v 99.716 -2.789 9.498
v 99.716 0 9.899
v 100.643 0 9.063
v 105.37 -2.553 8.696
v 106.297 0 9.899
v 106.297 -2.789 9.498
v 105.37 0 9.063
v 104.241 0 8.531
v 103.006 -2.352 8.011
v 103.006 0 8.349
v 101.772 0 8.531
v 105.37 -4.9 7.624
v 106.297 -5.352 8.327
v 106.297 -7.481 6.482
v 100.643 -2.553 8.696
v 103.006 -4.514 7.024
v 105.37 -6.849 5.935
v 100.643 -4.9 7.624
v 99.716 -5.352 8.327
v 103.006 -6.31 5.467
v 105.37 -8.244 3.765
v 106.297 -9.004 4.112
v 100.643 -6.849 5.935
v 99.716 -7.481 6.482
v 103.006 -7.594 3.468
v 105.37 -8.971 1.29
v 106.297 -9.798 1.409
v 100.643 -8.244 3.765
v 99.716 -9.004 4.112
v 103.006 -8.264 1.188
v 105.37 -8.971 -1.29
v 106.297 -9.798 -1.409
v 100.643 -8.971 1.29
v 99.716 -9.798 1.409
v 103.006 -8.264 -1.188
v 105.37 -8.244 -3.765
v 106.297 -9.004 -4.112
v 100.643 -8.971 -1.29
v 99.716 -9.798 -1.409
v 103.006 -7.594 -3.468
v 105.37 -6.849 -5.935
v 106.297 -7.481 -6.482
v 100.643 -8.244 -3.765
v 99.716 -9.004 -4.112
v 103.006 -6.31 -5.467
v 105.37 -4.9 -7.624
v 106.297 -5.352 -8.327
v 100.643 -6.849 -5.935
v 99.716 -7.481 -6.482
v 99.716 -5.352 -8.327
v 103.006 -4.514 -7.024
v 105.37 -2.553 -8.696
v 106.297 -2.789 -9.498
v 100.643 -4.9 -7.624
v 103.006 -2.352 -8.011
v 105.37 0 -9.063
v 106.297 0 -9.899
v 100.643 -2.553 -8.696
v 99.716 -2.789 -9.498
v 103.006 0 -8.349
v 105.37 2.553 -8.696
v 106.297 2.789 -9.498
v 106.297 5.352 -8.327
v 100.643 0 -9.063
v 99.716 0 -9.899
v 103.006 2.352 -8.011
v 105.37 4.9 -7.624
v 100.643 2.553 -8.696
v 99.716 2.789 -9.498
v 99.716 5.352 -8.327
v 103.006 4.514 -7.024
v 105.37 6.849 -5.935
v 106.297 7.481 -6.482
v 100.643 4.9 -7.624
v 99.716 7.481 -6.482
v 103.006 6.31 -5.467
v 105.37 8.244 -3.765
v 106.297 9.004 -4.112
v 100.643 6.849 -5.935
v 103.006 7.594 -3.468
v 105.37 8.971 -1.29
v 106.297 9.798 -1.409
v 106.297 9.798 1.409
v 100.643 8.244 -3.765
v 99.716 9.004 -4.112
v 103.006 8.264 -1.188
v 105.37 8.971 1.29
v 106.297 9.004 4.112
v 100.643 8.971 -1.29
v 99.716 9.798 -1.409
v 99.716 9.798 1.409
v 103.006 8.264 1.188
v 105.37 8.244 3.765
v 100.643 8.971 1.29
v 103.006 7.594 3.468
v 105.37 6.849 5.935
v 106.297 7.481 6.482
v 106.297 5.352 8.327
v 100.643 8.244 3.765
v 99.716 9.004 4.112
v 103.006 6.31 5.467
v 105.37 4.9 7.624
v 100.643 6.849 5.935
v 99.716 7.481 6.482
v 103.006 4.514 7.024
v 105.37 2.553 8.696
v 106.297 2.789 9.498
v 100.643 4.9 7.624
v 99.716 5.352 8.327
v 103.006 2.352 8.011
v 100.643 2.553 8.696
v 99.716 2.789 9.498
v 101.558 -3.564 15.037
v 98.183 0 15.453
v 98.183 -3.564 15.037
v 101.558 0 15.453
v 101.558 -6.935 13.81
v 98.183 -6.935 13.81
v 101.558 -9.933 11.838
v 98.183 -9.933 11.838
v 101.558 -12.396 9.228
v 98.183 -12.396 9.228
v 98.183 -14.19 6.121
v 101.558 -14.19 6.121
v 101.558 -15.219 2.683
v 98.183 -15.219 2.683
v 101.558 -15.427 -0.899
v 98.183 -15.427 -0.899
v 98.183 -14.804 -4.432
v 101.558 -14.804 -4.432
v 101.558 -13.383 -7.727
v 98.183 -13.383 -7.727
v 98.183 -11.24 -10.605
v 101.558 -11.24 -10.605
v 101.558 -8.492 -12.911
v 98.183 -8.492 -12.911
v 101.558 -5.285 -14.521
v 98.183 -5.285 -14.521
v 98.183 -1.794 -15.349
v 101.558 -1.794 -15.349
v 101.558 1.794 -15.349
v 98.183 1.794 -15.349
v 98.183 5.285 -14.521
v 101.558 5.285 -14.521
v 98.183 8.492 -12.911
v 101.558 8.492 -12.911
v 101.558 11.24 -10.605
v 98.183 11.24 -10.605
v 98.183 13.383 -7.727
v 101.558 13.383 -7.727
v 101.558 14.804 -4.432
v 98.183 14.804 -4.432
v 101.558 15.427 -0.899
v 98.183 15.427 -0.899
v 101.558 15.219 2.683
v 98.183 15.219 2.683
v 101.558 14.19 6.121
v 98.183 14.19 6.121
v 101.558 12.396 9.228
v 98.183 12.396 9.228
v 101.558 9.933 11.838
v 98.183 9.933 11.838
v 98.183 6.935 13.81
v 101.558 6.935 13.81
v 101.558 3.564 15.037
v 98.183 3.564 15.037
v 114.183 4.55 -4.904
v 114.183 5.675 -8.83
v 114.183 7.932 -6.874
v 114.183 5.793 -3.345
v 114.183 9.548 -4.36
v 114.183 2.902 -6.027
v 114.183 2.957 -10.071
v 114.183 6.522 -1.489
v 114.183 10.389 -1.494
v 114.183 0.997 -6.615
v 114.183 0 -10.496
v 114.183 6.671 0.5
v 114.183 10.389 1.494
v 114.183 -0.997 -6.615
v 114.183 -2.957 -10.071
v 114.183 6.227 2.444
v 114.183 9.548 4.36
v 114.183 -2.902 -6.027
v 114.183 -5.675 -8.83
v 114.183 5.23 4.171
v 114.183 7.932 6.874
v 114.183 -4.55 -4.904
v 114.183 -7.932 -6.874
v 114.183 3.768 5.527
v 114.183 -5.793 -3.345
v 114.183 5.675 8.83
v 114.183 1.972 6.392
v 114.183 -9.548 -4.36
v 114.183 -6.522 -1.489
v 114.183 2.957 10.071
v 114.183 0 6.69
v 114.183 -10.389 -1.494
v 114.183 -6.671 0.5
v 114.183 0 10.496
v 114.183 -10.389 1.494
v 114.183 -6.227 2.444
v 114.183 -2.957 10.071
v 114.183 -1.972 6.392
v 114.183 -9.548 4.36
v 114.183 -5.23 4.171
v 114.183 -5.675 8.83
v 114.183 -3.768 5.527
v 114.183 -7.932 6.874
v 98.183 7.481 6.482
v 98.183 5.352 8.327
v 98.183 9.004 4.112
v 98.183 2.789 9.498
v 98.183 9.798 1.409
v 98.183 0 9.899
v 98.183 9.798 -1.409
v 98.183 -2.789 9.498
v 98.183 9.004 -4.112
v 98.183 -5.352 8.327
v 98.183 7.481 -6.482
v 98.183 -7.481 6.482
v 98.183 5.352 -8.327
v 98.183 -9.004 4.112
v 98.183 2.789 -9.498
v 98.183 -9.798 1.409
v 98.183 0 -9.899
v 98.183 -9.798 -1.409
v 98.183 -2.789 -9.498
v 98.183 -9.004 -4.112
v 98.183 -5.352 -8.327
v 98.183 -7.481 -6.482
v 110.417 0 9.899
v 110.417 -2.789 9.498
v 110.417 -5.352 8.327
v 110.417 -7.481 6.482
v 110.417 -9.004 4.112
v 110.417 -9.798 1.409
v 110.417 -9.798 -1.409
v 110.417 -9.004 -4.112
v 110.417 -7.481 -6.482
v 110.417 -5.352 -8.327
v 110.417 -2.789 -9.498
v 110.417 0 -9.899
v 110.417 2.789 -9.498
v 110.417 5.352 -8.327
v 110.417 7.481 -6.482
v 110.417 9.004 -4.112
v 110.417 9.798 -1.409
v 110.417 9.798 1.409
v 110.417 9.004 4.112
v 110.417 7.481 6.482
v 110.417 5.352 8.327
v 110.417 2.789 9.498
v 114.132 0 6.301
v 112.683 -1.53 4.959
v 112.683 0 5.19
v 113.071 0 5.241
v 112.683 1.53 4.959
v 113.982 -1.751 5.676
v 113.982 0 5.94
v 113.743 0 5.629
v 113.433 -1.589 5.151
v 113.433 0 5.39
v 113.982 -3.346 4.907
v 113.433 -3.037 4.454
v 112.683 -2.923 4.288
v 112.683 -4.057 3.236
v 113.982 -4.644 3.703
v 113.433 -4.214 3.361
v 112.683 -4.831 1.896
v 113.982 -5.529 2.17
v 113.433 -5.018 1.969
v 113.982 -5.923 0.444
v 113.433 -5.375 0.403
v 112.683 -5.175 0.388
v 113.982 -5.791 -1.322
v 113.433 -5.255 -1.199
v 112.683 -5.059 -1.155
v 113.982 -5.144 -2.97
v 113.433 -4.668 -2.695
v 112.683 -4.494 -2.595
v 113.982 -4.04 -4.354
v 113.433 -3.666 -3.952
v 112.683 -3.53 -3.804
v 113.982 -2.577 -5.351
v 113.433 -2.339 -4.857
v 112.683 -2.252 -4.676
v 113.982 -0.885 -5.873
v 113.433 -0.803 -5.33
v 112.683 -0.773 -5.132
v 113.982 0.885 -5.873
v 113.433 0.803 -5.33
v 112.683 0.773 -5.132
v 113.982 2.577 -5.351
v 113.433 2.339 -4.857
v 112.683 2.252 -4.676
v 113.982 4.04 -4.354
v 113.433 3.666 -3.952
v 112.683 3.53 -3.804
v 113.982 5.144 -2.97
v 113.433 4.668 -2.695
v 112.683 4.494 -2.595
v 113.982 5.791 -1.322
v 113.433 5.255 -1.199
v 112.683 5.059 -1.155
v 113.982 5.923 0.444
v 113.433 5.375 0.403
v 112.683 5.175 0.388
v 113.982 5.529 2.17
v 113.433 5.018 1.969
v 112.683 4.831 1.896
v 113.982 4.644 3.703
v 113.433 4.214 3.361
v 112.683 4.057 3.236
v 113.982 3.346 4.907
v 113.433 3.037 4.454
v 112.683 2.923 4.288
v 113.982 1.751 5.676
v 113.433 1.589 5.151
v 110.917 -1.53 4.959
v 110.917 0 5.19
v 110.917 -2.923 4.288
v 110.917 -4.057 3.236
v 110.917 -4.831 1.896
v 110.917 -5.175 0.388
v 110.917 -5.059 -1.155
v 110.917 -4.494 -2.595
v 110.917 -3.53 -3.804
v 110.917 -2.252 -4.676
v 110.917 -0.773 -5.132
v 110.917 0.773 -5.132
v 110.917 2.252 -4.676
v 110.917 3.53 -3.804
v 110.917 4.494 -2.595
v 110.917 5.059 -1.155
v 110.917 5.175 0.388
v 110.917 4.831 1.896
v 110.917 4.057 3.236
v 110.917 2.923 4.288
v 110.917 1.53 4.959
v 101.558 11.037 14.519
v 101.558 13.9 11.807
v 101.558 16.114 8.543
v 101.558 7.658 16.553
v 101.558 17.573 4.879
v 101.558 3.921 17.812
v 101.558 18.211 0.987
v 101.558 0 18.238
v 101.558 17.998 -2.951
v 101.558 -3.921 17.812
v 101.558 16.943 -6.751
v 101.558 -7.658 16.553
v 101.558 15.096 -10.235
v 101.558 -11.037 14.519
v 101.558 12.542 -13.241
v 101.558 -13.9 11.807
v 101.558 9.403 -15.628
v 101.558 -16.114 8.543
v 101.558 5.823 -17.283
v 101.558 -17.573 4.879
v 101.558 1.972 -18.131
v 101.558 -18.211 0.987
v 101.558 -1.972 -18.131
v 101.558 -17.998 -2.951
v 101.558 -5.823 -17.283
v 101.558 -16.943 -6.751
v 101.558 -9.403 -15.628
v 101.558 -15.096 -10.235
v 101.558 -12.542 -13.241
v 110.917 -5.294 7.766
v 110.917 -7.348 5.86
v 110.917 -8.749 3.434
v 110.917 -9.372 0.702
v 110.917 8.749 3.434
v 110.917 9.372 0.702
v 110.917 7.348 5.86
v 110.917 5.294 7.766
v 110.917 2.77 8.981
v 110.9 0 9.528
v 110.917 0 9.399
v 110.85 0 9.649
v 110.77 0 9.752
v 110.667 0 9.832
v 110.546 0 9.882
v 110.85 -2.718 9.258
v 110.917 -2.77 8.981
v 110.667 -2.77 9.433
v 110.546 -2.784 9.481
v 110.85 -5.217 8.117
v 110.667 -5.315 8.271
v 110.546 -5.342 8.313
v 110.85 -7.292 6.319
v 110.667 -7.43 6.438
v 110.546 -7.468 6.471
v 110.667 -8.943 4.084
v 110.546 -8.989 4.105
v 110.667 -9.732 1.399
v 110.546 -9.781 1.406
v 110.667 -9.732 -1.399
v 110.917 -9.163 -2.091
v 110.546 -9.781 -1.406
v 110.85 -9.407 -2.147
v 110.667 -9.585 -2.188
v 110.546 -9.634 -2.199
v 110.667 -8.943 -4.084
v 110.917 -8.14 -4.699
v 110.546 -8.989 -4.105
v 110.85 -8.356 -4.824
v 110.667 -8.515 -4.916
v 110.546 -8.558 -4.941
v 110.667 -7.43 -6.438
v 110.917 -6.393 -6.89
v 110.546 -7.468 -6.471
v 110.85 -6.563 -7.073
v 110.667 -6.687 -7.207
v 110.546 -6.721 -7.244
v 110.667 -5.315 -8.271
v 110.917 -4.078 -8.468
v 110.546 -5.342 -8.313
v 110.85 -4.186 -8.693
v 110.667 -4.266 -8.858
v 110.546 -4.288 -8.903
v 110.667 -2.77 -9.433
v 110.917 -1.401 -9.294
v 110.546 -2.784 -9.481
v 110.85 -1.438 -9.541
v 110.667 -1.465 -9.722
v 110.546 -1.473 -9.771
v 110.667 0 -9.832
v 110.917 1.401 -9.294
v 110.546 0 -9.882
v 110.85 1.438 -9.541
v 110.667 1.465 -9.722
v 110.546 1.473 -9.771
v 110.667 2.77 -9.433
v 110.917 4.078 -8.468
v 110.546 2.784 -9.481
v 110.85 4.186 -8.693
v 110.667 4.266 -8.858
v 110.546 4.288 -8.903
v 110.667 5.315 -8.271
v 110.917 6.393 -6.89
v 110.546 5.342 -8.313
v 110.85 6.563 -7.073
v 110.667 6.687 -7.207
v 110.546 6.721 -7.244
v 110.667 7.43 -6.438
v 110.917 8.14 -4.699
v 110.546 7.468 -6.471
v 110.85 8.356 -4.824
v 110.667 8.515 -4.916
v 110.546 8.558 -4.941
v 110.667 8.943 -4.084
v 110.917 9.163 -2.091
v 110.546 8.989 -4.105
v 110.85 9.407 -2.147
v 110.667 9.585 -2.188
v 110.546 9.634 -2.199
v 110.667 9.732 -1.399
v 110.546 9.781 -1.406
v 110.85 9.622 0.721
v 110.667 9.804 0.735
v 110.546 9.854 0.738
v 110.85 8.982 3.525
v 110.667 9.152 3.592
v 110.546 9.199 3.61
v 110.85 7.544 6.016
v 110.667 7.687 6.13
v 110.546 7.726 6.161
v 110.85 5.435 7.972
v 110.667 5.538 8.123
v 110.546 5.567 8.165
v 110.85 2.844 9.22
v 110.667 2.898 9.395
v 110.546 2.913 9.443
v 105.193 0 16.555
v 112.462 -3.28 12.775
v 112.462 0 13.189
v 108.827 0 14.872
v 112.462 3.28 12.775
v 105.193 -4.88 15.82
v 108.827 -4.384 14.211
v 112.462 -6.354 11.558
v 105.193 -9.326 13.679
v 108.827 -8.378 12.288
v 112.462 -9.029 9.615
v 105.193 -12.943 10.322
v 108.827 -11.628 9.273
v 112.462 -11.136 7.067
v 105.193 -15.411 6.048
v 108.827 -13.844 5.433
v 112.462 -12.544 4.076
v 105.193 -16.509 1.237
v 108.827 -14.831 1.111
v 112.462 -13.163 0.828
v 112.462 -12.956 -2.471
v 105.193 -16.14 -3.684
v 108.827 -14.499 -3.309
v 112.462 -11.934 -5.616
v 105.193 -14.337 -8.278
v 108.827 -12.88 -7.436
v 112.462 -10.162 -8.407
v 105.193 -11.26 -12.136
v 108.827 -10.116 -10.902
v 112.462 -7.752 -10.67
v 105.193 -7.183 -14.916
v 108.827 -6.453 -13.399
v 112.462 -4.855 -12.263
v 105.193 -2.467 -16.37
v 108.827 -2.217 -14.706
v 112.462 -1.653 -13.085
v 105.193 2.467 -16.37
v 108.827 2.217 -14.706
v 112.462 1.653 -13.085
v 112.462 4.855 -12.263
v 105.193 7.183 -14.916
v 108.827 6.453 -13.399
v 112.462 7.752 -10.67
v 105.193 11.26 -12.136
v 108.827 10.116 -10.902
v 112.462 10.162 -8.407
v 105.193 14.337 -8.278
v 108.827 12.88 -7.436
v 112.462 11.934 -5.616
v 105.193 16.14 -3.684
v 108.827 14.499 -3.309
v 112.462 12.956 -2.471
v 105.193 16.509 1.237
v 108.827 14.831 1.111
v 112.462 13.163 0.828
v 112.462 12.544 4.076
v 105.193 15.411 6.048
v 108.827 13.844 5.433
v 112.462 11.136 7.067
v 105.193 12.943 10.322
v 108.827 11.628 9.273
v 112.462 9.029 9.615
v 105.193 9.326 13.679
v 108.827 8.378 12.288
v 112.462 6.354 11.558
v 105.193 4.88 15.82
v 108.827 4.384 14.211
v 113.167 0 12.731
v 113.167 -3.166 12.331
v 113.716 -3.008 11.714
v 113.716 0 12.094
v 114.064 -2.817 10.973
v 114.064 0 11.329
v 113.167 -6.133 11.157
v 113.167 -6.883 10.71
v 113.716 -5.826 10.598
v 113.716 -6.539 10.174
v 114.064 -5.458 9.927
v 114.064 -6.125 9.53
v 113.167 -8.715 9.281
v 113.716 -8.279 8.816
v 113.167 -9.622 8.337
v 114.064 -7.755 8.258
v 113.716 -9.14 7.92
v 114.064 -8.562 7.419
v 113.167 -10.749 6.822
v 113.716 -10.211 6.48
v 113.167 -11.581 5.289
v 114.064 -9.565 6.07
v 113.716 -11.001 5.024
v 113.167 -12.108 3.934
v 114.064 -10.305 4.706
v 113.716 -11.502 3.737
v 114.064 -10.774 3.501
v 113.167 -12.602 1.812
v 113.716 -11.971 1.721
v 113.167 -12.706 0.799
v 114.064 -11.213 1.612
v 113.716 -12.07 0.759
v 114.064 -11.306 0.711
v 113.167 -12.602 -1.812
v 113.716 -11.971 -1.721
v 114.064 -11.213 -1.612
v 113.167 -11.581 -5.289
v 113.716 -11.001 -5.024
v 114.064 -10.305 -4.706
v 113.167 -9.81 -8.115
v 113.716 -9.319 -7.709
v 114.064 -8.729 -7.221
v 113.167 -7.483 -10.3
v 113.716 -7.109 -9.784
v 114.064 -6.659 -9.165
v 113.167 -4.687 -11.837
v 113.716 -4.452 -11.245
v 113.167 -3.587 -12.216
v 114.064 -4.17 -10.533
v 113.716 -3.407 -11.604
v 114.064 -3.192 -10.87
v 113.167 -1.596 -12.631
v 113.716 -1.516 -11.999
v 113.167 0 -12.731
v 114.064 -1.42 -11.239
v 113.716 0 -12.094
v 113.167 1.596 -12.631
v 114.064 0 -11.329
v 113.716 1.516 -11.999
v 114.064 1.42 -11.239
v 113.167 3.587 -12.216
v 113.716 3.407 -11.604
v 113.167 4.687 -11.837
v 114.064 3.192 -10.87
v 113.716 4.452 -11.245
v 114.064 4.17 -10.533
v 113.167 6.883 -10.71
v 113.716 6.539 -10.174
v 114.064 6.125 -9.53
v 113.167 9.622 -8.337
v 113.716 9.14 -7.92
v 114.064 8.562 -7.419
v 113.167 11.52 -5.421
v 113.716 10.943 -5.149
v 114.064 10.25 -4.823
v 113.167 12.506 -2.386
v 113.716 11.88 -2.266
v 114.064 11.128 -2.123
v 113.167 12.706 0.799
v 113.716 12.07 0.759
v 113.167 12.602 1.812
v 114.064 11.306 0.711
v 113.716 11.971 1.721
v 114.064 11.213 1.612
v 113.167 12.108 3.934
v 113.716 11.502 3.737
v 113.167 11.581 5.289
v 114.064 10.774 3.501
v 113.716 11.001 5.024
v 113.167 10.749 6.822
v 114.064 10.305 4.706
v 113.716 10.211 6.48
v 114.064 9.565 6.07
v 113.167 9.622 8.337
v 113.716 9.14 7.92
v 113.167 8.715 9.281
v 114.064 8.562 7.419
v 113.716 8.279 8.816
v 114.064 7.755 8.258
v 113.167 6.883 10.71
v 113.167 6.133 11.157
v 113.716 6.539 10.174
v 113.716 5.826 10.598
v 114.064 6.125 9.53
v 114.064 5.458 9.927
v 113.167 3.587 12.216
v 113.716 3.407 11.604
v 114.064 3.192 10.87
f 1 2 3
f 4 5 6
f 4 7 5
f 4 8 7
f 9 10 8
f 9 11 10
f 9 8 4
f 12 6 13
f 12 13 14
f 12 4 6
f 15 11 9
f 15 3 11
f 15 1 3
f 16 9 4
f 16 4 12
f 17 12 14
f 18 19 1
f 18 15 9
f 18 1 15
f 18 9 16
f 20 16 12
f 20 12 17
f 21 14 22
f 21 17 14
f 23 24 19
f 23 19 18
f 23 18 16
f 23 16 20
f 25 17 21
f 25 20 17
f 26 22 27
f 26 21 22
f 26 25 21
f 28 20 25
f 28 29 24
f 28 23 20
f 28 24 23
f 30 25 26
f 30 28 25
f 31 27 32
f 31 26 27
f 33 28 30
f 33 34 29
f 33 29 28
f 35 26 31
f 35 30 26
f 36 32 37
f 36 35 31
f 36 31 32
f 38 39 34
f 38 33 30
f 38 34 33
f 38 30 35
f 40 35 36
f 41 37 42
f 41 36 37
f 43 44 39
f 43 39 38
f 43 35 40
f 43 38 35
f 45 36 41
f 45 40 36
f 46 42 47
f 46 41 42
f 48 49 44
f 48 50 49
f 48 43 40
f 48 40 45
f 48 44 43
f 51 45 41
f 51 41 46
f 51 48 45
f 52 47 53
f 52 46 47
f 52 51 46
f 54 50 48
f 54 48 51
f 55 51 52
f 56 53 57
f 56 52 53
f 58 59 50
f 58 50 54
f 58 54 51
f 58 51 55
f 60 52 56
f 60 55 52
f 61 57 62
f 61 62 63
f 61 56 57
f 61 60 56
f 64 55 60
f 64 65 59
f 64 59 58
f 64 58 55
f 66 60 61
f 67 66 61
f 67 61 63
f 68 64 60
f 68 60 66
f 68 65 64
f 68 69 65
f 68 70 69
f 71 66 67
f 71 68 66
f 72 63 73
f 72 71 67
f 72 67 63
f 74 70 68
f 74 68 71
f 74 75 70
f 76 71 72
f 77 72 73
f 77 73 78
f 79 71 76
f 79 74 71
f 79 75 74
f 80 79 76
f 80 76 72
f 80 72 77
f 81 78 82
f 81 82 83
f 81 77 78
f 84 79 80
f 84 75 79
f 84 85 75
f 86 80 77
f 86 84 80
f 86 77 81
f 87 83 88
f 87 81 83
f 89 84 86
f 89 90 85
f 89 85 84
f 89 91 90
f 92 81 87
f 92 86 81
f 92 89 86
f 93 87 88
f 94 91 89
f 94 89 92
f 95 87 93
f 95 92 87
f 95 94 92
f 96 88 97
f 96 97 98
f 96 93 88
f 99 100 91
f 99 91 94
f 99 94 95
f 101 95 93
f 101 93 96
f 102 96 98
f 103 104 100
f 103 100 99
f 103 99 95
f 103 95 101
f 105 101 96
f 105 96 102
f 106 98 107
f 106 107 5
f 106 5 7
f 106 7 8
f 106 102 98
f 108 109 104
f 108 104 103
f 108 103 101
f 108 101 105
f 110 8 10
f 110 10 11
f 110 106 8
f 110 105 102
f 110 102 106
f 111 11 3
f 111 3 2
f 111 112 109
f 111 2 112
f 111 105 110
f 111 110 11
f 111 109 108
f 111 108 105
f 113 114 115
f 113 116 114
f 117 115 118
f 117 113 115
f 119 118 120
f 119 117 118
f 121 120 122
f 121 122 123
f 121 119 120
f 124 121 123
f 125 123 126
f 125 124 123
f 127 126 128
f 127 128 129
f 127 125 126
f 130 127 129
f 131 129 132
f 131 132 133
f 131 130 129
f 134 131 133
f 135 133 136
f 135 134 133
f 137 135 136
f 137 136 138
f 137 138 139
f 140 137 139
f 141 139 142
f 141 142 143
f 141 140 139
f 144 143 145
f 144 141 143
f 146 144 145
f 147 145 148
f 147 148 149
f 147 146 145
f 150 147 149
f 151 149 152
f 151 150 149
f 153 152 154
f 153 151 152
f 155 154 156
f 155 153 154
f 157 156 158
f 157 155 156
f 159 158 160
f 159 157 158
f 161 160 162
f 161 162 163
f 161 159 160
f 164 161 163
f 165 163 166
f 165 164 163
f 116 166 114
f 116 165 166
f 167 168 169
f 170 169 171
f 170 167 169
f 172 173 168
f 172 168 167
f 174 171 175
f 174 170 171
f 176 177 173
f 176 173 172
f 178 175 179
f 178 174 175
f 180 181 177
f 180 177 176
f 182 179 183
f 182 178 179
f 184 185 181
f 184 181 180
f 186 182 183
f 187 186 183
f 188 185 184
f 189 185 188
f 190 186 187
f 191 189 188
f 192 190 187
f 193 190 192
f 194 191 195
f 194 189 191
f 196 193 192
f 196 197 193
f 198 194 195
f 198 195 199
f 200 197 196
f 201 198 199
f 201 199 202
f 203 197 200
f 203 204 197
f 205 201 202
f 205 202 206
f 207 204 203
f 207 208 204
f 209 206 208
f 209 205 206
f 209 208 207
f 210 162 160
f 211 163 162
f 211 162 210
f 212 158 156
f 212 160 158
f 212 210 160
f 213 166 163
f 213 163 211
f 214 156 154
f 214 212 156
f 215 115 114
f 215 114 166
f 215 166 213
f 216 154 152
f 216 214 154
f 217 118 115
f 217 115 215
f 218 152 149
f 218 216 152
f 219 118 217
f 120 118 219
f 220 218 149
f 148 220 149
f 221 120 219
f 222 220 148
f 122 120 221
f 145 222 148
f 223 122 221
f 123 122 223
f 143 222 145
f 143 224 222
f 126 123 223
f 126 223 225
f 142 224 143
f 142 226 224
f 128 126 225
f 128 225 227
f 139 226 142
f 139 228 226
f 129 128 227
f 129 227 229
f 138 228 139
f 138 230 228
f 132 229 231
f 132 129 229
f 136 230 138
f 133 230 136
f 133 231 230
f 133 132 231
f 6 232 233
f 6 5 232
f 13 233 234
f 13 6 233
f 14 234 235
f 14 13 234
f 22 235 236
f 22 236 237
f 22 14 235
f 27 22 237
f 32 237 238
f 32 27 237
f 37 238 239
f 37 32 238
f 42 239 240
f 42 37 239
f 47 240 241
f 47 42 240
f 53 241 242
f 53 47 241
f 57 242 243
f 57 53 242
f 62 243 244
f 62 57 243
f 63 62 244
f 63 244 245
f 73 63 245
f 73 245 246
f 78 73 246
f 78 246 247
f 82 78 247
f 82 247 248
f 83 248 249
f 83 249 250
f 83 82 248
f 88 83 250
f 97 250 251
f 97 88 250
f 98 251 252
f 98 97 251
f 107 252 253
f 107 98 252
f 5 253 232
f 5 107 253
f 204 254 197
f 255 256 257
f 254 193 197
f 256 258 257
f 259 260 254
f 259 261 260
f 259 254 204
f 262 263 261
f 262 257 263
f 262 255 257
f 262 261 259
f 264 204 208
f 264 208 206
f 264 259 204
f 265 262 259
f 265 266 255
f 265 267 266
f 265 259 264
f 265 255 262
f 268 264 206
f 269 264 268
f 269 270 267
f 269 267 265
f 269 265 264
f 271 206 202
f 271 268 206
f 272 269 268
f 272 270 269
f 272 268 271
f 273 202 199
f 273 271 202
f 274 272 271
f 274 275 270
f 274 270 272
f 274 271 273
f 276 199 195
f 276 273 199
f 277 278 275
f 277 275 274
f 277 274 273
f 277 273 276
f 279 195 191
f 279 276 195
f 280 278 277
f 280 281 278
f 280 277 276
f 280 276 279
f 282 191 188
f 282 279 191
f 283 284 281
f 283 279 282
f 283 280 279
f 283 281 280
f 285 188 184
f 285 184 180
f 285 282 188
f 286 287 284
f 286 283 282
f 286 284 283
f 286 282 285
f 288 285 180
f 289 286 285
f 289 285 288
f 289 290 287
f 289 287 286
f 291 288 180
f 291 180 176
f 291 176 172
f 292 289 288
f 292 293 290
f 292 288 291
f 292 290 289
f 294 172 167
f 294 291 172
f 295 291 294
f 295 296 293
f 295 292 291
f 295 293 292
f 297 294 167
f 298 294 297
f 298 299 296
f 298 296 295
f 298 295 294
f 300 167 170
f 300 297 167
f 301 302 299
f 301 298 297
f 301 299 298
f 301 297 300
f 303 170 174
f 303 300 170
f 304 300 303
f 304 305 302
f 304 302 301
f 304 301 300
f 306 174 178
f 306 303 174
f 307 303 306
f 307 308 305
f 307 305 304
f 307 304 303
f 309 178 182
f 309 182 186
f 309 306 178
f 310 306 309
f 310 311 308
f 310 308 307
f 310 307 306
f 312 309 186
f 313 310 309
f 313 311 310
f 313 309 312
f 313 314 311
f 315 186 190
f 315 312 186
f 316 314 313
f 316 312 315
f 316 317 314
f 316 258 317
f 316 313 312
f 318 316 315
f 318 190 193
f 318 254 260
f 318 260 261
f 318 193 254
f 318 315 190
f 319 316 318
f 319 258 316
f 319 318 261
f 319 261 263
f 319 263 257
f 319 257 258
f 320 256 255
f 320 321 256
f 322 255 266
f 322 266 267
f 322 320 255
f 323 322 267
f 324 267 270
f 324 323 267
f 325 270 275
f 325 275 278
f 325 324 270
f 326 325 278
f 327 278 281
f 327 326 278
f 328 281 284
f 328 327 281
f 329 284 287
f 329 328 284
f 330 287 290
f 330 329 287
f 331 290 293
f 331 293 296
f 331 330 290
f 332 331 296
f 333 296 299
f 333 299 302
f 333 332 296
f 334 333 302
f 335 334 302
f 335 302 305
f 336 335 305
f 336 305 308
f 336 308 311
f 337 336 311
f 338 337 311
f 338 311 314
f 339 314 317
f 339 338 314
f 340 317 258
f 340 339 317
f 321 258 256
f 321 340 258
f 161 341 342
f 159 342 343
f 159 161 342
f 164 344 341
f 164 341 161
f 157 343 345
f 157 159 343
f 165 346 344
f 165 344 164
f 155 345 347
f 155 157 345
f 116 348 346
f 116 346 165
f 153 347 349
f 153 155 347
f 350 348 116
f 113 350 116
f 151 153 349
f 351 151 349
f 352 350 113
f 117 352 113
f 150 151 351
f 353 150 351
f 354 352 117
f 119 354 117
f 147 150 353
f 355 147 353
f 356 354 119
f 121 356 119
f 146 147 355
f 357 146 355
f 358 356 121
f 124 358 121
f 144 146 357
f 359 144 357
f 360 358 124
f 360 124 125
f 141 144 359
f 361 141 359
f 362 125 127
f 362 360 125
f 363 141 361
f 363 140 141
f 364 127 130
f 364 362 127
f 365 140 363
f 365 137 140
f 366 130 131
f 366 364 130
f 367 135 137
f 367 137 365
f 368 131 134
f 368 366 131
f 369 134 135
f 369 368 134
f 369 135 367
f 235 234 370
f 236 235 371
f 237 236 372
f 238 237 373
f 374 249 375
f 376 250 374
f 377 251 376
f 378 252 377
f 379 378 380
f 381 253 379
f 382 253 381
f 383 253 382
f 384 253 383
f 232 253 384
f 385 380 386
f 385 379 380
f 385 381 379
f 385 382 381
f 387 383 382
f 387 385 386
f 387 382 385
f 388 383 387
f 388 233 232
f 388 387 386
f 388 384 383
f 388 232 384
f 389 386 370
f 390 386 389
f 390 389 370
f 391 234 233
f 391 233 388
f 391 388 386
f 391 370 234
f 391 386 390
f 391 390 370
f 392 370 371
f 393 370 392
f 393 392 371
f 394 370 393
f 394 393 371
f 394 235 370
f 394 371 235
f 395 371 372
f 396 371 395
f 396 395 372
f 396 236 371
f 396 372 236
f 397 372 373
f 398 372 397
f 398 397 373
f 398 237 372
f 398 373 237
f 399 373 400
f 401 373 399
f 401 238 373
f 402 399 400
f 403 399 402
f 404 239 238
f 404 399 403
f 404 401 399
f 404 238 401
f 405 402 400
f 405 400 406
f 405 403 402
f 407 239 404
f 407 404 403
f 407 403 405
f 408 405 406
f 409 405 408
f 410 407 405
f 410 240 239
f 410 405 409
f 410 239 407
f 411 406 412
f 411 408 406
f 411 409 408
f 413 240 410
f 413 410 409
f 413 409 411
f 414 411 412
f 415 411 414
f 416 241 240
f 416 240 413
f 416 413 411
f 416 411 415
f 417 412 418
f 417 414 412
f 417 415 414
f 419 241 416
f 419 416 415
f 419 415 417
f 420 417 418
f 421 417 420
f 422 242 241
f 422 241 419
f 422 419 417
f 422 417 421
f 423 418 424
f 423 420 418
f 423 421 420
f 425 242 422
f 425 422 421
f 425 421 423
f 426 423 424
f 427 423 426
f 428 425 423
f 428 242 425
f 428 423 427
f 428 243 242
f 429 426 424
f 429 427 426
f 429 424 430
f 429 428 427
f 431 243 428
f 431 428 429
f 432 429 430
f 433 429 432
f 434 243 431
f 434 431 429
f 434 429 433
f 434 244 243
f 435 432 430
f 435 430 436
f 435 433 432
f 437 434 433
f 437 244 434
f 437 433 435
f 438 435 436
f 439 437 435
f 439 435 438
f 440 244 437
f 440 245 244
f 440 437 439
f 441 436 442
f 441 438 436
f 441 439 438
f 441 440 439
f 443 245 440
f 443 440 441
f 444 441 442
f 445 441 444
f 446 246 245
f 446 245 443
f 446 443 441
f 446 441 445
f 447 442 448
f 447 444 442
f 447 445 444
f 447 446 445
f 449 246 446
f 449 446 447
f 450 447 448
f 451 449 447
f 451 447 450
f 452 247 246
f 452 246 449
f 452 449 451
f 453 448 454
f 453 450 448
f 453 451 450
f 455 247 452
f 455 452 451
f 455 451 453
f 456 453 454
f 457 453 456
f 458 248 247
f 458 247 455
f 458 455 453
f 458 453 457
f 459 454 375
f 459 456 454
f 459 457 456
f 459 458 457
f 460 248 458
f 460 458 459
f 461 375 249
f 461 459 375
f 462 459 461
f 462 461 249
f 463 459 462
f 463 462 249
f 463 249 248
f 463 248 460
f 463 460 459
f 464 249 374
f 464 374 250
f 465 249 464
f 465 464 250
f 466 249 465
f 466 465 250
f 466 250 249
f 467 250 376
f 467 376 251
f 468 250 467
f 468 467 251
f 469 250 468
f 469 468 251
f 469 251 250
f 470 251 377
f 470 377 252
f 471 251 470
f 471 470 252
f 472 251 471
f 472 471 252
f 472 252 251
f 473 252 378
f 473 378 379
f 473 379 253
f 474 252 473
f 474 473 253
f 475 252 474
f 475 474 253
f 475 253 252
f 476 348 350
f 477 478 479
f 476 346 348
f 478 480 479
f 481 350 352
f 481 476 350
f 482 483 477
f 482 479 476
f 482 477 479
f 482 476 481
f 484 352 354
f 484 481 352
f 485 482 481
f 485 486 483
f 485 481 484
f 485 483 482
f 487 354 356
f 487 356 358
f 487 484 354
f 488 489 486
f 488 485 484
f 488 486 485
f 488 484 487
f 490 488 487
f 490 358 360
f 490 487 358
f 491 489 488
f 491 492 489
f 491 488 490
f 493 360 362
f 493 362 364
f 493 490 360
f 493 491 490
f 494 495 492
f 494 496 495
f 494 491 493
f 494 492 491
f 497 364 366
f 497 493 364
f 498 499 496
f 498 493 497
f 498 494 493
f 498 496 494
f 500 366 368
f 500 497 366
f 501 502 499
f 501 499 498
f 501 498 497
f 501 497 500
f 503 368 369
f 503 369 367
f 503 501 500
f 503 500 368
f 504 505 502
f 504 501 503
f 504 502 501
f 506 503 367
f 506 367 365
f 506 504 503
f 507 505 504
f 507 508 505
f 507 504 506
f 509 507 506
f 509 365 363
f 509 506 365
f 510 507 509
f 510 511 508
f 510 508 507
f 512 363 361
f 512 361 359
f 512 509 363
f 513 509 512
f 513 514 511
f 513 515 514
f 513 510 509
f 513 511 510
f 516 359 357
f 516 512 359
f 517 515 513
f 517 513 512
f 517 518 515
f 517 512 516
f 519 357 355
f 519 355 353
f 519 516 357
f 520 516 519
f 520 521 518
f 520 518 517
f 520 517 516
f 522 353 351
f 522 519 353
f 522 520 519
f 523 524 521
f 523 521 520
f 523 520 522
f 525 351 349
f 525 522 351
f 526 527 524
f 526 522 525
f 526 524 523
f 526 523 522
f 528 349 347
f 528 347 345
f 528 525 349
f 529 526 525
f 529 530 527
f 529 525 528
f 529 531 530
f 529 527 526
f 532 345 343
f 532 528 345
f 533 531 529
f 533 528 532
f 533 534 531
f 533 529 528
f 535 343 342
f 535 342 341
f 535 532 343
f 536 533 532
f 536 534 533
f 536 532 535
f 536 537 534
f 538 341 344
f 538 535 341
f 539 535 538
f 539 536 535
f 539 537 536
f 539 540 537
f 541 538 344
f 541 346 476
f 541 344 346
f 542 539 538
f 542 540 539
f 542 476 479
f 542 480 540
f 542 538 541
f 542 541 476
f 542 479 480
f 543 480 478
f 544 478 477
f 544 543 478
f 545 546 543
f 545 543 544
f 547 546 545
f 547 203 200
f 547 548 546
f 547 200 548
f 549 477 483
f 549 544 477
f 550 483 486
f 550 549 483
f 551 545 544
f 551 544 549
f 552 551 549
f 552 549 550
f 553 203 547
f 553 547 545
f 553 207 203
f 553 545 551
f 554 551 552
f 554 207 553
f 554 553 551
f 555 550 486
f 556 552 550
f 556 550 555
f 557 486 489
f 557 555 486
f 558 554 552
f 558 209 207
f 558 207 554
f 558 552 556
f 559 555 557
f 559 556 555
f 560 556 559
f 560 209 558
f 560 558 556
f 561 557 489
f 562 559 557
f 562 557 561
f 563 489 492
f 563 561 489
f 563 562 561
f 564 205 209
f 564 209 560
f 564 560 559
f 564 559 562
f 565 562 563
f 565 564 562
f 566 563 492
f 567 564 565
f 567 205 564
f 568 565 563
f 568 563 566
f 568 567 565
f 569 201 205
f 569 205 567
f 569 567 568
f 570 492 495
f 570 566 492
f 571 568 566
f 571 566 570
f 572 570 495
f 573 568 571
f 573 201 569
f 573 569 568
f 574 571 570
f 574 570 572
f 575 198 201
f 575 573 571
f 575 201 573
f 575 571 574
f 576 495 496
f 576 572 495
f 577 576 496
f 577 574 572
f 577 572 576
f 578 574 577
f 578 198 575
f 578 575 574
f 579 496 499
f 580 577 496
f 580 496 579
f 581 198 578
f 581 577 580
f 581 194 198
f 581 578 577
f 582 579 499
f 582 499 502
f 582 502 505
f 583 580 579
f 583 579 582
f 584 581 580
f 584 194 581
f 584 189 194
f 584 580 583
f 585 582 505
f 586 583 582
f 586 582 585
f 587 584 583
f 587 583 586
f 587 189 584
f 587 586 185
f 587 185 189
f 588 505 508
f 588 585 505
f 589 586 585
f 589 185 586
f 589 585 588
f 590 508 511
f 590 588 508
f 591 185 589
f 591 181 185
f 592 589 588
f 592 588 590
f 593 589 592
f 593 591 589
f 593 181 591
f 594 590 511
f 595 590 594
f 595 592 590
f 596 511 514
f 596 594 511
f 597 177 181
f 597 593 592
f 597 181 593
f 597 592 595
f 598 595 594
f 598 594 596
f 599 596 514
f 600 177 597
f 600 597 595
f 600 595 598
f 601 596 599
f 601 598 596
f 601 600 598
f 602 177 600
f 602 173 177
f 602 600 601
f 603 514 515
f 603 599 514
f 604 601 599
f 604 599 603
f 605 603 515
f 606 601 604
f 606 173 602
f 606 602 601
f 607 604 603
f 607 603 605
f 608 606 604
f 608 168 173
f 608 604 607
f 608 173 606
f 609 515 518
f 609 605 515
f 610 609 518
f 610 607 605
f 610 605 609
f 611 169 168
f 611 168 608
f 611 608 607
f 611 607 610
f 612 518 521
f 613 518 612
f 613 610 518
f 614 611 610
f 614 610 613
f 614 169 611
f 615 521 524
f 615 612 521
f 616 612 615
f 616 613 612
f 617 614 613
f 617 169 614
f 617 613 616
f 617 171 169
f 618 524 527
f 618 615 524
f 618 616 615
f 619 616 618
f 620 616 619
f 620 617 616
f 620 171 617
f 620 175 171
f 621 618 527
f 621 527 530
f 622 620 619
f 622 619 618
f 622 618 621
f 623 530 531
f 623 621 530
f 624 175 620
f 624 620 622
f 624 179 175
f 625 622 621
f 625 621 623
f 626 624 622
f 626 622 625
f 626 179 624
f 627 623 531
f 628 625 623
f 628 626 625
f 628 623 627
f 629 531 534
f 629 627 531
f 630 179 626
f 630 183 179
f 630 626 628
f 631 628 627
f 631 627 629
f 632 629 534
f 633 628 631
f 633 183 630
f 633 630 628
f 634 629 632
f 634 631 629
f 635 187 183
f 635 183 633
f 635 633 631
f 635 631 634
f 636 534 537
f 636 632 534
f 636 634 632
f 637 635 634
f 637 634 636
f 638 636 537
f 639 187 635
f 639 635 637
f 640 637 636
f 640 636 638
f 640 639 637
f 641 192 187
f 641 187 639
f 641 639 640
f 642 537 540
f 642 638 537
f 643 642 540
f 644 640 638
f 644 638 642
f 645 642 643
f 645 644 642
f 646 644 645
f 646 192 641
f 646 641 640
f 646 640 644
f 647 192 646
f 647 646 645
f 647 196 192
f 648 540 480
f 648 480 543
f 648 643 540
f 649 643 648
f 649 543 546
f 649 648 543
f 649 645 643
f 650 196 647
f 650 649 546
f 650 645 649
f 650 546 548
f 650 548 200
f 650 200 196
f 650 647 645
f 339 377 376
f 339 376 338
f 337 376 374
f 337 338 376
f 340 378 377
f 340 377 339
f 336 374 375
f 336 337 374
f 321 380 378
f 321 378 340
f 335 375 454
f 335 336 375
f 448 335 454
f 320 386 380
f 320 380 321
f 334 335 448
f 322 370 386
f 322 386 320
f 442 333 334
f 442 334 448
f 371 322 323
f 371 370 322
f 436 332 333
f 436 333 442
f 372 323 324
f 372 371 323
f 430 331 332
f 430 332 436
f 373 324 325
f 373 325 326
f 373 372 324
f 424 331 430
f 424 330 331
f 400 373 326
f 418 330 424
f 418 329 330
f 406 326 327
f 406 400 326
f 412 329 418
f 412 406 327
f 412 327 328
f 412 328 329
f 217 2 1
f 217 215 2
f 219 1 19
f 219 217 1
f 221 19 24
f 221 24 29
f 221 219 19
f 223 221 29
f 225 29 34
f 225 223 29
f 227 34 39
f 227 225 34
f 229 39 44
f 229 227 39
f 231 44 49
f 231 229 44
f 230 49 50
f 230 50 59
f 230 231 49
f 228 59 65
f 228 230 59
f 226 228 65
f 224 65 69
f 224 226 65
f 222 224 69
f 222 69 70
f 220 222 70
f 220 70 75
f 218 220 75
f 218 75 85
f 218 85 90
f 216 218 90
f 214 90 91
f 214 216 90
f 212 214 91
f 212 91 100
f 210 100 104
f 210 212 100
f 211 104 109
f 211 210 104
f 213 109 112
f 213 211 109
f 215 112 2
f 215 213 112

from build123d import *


with BuildPart() as part:
    # Esquisse1 → Révolution1 (revolve)
    with BuildSketch(Plane.XY, mode=Mode.PRIVATE) as r_volution1_sk:
        with BuildLine():
            Line((98.182636899, 9.898736356), (98.182636899, 15.453384419))
            Line((98.182636899, 15.453384419), (101.558174274, 15.453384419))
            Line((101.558174274, 15.453384419), (101.558174274, 18.238189454))
            Line((101.558174274, 18.238189454), (112.461882094, 13.189244146))
            ThreePointArc((112.461882094, 13.189244146), (113.715718176, 12.094110728), (114.182636899, 10.496171735))
            Line((114.182636899, 10.496171735), (114.182636899, 6.689516504))
            ThreePointArc((114.182636899, 6.689516504), (113.743297071, 5.628856332), (112.682636899, 5.189516504))
            Line((112.682636899, 5.189516504), (110.916617784, 5.189516504))
            Line((110.916617784, 5.189516504), (110.916617784, 9.398736356))
            ThreePointArc((110.916617784, 9.398736356), (110.770171174, 9.752289746), (110.416617784, 9.898736356))
            Line((110.416617784, 9.898736356), (106.29719914, 9.898736356))
            ThreePointArc((106.29719914, 9.898736356), (103.00637414, 8.348852557), (99.715549141, 9.898736356))
            Line((99.715549141, 9.898736356), (98.182636899, 9.898736356))
        make_face()
    revolve(r_volution1_sk.sketch.rotate(Axis((81.048552149, 0, 0), (1, 0, 0)), 90), axis=Axis((81.048552149, 0, 0), (1, 0, 0)))


solid = part.part
